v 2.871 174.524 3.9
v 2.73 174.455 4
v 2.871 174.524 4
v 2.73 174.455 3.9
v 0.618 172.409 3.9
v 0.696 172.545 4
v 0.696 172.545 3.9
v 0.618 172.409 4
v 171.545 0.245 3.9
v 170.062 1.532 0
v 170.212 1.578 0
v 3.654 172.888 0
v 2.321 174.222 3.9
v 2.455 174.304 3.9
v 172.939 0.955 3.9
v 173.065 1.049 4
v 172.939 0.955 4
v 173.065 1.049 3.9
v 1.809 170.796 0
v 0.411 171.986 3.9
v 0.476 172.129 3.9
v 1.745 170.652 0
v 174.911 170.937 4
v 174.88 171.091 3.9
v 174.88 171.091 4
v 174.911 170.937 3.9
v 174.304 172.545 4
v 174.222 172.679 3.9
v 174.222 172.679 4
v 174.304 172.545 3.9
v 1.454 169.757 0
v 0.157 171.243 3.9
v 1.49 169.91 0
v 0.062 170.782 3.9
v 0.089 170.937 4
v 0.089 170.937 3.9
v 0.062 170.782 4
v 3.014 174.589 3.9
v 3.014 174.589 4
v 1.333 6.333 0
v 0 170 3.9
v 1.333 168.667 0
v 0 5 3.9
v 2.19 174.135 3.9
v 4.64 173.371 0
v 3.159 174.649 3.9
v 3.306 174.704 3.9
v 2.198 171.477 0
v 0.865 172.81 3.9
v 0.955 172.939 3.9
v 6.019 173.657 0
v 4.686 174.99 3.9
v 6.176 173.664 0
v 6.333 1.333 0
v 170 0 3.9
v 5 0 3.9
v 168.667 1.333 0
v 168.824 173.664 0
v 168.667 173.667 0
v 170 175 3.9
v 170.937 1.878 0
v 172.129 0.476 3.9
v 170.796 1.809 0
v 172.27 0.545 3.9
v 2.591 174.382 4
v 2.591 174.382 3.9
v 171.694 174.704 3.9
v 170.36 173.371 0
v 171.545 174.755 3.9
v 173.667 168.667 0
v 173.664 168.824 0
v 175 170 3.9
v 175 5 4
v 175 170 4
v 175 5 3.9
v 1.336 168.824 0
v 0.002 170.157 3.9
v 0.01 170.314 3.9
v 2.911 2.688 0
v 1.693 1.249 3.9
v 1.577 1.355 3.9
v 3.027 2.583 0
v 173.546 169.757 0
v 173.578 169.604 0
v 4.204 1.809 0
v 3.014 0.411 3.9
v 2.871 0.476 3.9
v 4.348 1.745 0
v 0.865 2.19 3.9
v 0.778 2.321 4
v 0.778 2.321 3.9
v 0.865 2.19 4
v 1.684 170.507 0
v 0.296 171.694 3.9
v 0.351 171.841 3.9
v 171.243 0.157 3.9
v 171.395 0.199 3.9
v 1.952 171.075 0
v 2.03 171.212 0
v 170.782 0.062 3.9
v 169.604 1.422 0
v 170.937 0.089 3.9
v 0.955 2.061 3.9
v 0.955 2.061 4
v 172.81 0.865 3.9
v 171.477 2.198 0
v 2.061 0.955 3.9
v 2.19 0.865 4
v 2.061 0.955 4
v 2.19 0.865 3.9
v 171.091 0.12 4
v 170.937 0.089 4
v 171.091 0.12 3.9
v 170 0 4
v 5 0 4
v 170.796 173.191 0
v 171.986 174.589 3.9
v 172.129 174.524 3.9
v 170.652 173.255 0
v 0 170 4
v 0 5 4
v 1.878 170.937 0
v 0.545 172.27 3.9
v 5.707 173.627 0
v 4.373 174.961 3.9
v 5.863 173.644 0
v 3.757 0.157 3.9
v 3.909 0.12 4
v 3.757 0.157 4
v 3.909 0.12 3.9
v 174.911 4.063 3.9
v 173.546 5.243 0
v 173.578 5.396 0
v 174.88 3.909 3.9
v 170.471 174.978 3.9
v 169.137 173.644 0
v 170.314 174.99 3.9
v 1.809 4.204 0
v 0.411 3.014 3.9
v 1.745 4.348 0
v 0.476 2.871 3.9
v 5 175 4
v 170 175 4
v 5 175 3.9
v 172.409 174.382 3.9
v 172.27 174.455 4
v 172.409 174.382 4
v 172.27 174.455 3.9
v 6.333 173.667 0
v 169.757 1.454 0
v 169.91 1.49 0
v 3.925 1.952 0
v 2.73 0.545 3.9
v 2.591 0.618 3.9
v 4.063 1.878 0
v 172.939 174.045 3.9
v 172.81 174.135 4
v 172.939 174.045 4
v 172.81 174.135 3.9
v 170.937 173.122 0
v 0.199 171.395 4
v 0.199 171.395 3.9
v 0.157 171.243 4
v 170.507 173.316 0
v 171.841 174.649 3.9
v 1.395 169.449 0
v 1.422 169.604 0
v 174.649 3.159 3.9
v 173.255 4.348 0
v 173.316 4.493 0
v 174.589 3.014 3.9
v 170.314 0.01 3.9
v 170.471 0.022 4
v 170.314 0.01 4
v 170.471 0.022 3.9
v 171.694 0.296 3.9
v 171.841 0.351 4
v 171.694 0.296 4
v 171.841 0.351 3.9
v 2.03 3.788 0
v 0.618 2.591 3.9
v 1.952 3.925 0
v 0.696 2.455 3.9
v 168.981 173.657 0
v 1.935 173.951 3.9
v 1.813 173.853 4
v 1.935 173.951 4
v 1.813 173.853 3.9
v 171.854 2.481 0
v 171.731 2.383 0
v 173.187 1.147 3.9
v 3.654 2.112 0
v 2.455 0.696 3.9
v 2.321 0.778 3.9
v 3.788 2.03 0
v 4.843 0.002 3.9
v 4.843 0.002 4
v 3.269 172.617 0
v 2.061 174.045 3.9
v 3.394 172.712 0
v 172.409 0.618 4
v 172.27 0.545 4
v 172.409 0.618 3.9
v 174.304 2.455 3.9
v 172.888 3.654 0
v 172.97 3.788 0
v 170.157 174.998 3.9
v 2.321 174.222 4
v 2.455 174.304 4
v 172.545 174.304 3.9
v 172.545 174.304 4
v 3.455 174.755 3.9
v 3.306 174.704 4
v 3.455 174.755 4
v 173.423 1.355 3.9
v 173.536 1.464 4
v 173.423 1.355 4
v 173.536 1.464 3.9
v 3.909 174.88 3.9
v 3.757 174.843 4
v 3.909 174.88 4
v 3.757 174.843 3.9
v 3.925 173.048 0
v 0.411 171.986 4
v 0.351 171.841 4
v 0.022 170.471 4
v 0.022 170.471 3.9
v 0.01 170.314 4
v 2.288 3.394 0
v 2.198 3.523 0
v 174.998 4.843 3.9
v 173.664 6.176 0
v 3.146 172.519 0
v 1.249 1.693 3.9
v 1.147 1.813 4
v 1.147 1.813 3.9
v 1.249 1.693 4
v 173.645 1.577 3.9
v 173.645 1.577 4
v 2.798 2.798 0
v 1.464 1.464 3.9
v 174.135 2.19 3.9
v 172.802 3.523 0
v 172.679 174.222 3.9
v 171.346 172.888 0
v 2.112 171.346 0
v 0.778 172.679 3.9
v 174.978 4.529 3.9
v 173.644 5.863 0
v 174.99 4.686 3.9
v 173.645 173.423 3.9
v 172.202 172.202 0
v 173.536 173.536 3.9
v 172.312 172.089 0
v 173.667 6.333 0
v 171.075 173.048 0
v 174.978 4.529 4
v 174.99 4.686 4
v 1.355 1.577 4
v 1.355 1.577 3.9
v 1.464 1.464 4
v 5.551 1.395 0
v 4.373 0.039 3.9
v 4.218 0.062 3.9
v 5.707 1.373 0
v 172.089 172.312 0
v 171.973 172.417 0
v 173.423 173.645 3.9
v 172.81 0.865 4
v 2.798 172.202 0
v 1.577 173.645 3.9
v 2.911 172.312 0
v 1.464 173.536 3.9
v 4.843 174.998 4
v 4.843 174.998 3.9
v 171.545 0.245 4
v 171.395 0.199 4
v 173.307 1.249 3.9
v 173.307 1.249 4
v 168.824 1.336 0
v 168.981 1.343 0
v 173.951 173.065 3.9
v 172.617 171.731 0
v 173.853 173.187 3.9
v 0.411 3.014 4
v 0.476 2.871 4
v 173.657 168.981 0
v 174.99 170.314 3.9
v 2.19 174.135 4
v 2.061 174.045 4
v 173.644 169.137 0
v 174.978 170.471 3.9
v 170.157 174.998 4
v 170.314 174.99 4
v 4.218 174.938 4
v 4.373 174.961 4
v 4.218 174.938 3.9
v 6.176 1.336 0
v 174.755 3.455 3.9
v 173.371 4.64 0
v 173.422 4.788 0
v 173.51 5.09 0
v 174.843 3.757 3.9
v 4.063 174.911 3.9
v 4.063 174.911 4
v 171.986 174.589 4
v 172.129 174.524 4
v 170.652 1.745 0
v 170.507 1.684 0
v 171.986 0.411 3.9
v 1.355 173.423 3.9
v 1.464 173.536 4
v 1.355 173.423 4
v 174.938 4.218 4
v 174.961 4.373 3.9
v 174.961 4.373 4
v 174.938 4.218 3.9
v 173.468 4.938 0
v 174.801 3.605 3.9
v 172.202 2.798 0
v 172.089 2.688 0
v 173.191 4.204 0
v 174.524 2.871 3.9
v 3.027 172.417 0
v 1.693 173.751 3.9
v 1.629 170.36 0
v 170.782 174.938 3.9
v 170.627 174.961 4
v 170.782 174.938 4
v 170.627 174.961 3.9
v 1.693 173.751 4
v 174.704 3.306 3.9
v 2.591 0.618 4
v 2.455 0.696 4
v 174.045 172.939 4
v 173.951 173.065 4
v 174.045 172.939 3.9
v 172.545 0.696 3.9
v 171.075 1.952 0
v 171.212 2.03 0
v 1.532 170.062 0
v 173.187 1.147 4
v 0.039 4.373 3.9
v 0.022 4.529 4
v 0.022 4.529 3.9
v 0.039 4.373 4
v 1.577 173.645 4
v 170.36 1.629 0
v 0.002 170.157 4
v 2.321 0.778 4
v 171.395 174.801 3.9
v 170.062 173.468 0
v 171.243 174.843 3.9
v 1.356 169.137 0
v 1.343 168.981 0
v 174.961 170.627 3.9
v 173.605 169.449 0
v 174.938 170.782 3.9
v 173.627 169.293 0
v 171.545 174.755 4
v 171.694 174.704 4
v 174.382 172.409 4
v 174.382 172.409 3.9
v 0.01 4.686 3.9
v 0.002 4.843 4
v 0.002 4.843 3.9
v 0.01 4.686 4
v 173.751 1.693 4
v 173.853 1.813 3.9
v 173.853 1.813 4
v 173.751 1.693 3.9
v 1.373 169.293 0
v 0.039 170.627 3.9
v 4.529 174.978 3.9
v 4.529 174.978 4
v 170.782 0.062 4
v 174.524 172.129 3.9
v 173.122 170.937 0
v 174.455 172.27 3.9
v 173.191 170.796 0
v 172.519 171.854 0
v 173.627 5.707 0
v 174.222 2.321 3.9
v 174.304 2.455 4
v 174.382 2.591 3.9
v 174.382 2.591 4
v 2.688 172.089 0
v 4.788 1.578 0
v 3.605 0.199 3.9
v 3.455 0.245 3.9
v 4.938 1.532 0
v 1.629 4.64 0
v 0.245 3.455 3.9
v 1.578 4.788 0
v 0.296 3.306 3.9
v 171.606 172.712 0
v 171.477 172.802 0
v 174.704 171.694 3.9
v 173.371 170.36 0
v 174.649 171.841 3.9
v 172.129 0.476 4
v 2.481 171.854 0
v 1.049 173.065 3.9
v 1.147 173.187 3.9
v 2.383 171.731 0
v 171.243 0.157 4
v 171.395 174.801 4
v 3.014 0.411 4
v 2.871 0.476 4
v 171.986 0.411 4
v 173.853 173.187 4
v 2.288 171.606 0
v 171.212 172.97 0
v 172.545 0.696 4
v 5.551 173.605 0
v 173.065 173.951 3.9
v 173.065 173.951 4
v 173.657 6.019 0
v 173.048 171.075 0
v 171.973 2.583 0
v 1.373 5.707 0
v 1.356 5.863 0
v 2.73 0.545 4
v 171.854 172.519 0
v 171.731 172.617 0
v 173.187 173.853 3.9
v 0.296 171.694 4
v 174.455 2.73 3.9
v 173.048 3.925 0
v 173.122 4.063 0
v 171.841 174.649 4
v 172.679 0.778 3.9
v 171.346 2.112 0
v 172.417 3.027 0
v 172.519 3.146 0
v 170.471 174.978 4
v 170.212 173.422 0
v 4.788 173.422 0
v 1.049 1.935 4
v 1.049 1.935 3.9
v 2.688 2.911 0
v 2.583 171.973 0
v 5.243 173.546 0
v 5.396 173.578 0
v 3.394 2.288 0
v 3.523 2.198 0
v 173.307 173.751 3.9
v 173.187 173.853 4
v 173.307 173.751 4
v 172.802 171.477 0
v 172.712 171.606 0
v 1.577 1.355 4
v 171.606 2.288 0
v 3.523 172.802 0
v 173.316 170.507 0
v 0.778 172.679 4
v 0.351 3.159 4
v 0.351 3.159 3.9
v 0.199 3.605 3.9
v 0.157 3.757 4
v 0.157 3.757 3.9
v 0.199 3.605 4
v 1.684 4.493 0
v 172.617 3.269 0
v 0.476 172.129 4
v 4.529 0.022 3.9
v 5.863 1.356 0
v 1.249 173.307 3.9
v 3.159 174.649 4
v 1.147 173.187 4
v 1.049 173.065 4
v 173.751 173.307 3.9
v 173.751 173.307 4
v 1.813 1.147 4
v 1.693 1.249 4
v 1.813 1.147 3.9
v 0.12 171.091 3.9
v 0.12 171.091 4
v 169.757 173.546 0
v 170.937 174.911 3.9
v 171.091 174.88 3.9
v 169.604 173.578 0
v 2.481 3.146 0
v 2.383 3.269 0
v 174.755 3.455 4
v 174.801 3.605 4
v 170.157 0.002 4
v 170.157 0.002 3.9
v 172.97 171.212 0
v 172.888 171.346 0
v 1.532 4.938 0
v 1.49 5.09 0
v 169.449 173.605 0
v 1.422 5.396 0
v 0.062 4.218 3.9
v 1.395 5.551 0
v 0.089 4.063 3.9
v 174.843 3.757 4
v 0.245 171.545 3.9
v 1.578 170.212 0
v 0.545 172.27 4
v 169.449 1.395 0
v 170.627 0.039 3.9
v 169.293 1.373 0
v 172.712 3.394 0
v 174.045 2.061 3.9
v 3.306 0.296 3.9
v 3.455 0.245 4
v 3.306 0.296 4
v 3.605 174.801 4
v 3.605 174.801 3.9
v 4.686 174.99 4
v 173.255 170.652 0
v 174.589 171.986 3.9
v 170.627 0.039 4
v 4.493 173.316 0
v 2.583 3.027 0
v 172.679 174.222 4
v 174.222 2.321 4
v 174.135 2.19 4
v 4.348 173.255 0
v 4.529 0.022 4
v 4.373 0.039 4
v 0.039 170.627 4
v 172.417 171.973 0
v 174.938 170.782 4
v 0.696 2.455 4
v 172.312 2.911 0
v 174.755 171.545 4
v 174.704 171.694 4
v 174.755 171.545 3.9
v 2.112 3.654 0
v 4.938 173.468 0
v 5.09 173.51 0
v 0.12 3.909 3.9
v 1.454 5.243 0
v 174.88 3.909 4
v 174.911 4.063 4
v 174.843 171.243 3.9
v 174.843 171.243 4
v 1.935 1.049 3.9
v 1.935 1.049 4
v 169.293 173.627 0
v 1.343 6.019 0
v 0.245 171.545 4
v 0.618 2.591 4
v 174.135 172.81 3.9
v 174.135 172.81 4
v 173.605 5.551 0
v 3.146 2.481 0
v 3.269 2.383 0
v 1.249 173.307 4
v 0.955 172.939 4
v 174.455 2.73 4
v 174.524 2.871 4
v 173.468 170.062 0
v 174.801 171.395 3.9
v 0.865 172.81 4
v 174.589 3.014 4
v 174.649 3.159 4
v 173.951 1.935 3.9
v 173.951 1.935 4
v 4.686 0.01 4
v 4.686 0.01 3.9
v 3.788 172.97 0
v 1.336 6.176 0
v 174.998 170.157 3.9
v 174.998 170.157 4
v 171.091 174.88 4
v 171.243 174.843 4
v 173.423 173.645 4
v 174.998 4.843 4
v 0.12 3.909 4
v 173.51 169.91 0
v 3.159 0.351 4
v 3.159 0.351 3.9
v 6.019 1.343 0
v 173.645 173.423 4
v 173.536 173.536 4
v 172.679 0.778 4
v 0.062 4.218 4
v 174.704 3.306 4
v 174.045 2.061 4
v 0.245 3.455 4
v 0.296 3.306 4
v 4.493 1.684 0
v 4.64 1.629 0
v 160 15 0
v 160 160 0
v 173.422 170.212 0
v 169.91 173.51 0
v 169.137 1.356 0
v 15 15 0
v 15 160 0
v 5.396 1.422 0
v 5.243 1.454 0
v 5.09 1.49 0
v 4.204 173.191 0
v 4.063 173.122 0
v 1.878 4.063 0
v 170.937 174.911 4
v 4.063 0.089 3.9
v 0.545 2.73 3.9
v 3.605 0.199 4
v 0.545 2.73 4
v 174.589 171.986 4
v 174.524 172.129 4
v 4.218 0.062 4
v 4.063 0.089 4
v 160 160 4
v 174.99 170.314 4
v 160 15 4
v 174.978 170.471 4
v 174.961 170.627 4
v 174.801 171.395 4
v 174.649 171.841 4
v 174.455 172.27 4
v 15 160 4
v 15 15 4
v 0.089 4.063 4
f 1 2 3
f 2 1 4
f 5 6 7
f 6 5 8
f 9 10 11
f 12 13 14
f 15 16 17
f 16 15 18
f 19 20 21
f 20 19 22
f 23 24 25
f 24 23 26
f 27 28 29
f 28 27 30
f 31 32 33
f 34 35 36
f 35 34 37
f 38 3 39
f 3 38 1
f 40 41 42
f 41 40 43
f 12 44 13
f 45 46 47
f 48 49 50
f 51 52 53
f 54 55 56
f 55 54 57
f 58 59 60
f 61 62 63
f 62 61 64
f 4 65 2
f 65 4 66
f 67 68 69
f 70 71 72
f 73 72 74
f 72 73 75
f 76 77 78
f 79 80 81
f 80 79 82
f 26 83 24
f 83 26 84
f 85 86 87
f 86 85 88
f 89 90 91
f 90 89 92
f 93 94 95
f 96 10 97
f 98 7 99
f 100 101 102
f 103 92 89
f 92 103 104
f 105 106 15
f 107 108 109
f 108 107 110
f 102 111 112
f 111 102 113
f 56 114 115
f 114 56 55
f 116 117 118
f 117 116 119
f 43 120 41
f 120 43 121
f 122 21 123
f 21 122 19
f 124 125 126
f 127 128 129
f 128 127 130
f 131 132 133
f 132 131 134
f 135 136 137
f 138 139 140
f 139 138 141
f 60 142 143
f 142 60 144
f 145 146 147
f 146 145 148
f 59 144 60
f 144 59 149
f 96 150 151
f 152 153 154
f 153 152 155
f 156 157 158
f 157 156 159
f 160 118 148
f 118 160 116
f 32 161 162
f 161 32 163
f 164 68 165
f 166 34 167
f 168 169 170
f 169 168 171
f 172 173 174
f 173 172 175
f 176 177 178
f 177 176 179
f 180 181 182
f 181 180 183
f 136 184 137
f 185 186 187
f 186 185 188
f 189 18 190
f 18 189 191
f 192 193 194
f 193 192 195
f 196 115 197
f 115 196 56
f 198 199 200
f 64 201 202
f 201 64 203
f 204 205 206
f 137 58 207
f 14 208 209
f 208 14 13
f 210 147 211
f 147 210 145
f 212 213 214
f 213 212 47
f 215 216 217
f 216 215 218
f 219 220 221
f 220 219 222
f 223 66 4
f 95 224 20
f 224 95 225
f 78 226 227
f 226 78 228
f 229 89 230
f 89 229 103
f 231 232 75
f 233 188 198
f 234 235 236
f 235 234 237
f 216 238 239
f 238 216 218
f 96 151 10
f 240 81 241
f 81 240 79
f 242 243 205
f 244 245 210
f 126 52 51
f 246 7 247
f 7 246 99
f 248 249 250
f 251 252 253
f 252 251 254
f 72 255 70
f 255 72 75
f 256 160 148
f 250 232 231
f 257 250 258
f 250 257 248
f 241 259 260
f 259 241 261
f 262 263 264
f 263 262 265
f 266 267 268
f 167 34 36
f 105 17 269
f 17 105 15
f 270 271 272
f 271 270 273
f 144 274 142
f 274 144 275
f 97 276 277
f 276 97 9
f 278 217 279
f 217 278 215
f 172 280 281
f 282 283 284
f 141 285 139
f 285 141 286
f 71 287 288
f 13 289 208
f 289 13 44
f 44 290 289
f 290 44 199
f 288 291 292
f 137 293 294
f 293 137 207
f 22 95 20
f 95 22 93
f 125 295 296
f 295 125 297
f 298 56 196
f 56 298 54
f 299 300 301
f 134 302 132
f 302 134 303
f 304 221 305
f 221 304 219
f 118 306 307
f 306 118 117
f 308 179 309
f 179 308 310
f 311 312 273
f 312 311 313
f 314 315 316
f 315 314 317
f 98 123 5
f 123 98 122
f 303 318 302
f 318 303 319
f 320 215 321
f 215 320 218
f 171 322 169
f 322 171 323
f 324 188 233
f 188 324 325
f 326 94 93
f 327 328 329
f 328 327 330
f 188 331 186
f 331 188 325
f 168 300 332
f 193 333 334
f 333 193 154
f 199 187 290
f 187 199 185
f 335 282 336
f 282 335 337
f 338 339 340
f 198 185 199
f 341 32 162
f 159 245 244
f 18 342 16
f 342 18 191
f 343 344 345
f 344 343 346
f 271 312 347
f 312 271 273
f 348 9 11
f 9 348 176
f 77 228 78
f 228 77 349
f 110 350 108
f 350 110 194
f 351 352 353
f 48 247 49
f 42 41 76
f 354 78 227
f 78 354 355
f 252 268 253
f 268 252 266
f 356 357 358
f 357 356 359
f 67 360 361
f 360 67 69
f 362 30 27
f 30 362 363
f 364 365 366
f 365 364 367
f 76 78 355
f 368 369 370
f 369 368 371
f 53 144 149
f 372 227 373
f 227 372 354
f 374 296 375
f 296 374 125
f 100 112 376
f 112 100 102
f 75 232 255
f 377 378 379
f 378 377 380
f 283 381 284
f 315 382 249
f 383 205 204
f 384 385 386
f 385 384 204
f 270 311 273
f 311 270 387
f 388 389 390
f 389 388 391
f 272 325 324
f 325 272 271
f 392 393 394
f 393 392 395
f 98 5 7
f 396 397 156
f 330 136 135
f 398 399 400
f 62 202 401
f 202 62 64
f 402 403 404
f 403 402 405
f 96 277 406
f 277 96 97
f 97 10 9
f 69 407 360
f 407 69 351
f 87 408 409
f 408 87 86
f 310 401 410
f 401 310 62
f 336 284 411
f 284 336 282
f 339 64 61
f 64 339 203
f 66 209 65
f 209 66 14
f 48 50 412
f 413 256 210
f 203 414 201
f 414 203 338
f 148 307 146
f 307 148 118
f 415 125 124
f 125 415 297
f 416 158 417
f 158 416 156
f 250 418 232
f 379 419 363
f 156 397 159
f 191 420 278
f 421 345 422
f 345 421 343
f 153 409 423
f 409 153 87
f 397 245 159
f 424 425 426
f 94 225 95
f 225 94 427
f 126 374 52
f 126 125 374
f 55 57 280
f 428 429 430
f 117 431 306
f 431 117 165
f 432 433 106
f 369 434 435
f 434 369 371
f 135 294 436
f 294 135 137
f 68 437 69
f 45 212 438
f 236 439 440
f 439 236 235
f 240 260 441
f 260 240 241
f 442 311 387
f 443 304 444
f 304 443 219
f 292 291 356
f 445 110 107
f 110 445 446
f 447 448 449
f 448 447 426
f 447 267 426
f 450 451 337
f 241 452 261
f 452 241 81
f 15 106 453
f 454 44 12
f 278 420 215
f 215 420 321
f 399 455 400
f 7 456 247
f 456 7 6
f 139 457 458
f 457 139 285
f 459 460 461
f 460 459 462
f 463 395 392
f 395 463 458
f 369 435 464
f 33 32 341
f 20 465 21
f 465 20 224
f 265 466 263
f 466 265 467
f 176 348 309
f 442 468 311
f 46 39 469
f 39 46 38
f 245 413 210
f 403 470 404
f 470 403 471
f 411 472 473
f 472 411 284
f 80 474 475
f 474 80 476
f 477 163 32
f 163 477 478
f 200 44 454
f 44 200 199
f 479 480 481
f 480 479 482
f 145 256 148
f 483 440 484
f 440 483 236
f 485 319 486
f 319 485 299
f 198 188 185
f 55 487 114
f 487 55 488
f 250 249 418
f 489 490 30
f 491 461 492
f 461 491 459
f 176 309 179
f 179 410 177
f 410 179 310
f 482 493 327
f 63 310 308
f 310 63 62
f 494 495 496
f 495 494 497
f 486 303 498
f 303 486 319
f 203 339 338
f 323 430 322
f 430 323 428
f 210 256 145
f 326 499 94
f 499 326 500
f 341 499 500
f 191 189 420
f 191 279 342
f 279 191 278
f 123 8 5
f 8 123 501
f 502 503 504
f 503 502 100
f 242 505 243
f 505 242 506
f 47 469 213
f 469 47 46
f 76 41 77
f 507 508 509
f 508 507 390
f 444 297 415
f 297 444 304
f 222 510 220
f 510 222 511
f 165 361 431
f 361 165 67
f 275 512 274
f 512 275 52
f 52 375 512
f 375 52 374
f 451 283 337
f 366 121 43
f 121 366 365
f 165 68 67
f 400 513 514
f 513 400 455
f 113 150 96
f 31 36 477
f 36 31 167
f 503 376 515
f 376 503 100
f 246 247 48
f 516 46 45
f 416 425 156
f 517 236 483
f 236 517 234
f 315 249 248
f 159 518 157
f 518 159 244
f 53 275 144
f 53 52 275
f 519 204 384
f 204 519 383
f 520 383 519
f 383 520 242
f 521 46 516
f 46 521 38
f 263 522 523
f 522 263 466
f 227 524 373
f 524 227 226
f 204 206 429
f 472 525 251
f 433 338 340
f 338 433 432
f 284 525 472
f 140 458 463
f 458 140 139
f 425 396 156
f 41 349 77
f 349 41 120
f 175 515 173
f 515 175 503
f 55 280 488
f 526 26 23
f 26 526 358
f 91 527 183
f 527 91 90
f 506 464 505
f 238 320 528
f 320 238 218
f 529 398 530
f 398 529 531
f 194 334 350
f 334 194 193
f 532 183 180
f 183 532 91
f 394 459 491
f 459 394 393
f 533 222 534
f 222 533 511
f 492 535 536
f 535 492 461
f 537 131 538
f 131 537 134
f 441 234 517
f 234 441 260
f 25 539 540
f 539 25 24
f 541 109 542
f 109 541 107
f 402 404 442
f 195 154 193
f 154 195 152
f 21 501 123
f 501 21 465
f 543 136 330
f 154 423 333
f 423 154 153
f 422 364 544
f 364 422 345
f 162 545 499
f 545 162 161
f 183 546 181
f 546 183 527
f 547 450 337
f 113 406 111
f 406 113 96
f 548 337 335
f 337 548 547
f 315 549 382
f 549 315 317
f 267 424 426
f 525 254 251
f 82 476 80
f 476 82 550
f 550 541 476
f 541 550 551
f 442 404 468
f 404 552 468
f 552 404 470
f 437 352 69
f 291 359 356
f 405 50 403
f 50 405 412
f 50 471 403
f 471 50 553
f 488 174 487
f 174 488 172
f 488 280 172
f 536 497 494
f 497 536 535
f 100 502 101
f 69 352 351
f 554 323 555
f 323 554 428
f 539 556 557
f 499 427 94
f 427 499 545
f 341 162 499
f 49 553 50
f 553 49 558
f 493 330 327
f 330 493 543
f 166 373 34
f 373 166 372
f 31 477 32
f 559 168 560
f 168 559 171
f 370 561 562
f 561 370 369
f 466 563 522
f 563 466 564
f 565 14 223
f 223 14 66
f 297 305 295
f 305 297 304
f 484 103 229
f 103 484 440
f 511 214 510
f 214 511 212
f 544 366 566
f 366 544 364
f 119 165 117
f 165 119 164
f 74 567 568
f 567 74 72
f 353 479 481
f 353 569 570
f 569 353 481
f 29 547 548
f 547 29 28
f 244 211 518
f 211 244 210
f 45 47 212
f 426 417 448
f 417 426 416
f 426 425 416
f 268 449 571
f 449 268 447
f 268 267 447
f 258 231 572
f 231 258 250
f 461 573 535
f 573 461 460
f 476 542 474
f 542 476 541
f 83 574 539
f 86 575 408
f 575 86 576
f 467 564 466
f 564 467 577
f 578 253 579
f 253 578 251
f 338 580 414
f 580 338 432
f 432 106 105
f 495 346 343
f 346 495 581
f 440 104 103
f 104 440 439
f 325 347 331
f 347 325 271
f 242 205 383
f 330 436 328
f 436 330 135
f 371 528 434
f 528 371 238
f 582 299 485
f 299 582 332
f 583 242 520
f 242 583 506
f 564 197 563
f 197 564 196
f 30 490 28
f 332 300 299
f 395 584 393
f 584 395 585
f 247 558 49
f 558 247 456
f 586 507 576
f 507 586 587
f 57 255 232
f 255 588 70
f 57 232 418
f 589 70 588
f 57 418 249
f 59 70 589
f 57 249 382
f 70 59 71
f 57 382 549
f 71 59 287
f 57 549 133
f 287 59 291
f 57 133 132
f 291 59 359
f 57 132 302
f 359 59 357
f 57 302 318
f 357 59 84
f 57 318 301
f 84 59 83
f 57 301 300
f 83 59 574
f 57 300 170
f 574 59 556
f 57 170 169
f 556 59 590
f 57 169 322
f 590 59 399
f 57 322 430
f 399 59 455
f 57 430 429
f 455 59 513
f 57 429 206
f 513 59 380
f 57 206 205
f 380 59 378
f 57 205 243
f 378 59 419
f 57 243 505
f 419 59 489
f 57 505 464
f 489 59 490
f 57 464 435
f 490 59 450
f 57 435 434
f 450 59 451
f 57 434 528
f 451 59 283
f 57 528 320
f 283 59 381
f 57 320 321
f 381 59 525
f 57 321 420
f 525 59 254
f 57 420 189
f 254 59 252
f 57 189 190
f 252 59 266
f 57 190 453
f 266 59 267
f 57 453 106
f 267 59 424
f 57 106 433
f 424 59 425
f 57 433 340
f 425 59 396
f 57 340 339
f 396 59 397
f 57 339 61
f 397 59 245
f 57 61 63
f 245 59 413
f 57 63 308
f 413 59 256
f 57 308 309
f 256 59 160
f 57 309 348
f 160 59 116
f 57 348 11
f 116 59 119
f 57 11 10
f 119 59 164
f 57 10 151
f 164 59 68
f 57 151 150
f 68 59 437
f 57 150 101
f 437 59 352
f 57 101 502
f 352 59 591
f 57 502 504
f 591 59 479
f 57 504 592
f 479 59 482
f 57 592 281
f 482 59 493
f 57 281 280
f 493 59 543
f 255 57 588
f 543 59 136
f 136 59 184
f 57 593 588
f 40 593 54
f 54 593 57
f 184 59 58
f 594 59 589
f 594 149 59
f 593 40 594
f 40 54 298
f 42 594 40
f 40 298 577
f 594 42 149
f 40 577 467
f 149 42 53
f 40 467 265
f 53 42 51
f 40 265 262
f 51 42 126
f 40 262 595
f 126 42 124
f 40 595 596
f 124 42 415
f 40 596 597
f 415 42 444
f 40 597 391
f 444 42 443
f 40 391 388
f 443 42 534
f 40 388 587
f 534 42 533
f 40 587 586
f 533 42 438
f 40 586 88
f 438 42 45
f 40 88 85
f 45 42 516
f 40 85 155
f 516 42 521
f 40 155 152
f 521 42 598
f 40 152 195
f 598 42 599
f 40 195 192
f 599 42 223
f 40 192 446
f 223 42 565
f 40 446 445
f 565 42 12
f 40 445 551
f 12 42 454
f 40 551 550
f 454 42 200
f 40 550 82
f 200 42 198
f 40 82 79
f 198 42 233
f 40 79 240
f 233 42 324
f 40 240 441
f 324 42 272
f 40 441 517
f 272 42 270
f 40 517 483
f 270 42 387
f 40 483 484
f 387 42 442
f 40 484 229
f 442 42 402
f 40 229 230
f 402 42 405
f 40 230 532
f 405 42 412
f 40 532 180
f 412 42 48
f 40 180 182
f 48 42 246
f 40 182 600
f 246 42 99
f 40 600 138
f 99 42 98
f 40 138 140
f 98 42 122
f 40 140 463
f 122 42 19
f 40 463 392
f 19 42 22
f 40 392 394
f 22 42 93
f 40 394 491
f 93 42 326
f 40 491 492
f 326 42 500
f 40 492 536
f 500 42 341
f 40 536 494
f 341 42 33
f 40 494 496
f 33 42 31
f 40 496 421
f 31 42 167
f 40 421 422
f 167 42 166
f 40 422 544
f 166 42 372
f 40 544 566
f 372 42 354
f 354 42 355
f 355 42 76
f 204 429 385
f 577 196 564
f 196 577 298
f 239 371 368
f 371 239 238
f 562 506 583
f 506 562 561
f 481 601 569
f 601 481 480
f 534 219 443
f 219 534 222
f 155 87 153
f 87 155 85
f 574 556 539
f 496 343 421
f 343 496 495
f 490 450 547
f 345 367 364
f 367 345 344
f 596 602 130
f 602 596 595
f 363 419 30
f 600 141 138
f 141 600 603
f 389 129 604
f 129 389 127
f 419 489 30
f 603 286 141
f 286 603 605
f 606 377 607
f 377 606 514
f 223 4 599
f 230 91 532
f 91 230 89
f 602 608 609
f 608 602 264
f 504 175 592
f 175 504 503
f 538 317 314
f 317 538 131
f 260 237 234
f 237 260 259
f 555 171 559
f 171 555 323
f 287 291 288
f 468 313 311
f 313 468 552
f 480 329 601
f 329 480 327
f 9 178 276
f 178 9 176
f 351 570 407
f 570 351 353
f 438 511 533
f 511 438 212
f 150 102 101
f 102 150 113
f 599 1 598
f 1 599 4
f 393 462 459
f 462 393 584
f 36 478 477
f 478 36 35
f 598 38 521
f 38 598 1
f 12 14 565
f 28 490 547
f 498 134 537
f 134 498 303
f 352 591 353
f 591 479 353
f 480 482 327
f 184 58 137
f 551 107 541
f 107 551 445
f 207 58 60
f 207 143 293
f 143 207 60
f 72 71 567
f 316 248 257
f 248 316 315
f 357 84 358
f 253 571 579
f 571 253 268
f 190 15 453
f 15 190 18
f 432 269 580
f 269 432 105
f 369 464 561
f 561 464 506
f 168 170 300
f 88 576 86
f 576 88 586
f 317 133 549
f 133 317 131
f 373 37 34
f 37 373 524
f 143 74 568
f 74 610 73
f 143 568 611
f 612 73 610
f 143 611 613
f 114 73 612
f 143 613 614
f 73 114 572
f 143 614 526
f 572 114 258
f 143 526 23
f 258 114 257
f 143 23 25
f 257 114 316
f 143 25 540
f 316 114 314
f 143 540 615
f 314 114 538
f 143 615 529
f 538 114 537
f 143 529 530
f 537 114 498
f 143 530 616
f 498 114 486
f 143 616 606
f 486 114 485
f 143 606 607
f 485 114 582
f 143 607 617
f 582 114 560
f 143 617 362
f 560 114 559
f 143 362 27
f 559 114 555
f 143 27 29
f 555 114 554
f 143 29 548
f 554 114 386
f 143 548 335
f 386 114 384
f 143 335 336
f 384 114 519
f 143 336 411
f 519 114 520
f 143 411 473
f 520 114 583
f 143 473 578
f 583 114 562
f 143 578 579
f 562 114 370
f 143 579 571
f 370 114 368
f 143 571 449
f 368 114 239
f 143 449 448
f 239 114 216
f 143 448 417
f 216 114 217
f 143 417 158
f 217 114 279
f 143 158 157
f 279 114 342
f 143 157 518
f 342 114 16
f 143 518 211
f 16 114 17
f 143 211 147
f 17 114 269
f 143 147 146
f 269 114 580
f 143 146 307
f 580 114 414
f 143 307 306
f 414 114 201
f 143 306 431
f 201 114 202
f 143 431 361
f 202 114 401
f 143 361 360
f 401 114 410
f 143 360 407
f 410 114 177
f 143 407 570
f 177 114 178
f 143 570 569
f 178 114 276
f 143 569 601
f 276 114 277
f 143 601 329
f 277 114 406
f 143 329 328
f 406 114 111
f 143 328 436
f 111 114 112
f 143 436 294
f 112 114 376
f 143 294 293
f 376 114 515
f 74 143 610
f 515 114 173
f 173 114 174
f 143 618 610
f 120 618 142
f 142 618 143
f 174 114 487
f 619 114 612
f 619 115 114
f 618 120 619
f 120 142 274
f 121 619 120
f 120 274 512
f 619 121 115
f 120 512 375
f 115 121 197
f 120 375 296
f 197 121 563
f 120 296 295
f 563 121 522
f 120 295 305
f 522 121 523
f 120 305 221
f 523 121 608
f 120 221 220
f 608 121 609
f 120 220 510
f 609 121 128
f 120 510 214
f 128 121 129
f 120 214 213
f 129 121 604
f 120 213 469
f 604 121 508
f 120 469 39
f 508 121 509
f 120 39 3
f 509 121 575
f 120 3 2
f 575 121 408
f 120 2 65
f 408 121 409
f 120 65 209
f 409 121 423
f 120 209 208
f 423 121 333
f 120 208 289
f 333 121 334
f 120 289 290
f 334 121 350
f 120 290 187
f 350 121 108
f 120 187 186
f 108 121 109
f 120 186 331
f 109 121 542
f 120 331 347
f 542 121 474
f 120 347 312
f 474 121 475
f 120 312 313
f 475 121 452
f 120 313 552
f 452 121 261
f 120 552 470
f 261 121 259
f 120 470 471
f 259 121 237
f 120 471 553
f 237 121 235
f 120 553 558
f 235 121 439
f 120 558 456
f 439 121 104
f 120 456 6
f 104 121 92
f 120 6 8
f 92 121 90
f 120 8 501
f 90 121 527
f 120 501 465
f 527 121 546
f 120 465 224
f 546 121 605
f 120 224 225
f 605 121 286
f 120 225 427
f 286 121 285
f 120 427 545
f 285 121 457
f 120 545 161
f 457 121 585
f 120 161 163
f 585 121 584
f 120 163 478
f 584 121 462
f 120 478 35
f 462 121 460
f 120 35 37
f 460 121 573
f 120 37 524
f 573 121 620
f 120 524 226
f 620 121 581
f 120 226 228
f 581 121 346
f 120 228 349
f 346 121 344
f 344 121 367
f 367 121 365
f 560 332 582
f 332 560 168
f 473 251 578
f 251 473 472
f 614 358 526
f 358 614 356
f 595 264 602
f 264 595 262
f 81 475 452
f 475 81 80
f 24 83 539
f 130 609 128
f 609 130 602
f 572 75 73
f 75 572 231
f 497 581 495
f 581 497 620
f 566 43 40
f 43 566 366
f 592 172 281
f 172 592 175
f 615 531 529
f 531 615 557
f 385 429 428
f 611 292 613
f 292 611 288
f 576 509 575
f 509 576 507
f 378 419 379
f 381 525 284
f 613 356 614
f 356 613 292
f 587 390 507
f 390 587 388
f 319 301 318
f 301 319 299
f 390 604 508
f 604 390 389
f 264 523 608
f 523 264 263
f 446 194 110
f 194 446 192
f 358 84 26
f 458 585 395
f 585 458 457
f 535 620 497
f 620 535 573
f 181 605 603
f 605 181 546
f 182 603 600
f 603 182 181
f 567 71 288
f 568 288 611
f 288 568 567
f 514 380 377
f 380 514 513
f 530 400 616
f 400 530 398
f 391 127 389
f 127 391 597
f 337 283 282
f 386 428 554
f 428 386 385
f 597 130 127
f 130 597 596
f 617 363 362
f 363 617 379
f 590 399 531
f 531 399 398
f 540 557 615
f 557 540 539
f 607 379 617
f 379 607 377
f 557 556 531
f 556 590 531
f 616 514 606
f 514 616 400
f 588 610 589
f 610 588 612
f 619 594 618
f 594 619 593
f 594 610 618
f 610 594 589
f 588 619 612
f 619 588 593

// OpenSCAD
// file: ../sc.scad
// ShortCuts.scad 
// Autor: Rudolf Huttary, Berlin 2015
//
$fn = 100; 

//show_examples(); 

module show_examples()
	place_in_rect(30, 30)
	{
		Cy(h = 10); 
		CyH(h = 10); 
		CyH(h = 10, w = 30); 
		CyS(h = 10); 
		CyS(h = 10, w1 = 25, w2 = 75); 
		Cu(10); 
		Ri(h = 10); 
		RiH(h = 10); 
		RiS(h = 10, w1 = 10); 
		RiS(h = 10, w1 = 30, w2 = 300); 
		Sp(); 
		SpH(10, 30, 30); 
	}


module help()
{
echo("==============="); 
echo("help(): shows this help"); 
echo("show_examples(): shows some examples"); 
echo("place_in_rect(): places children objects in grid"); 
echo("Transformations:"); 
echo(" transform :  T(x=0, y=0, z=0), Tx(x=0) , Ty(y=0), Tz(z=0)"); 
echo(" rotate :  R(x=0, y=0, z=0), Rx(x=0) , Ry(y=0), Rz(z=0)"); 
echo(" scale :  S(x=1, y=1, z=1), Sx(x=1) , Sy(y=1), Sz(z=1)"); 
echo("Logical"); 
echo(" difference :  D()"); 
echo(" union :  U()"); 
echo(" intersection : *missing*"); 
echo("Primitives"); 
echo(" circle :  Ci(r=10)"); 
echo(" circle_half :  CiH(r=10, w=0)")
echo(" circle_segment :  CiS(r=10, w1=0, w2=90)")
echo(" square :  Sq(x=10, y=0, center=true))"); 
echo(" cylinder :  Cy(r=10, h=1, center=true)"); 
echo(" cylinder_half :  CyH(r=10, w=0)")
echo(" cylinder_segment: CyS(r=10, h=1, w1=0, w2=90,center=true)"); 
echo(" cylinder_segment: Pie(r=10, h=1, w1=0, w2=90,center=true)"); 
echo(" cube :  Cu(x=10, y=0, z=10, center=true)"); 
echo(" ring :  Ri(R=10, r=5, h=1, center=true)"); 
echo(" ring_half :  RiH(R=10, r=5, h=1, w=0 center=true)"); 
echo(" ring_segment :  RiS(R=10, r=5, h=1, w1=0, w2=90, center=true)"); 
echo(" sphere:  Sp(r=10))"); 
echo(" sphere_half:  SpH(r=10, w1 = 0, w2 = 0))"); 
echo("==============="); 
}

// Euclidean Transformations
module T(x=0, y=0, z=0){translate([x, y, z])children(); }
module Tx(x) { translate([x, 0, 0])children(); }
module Ty(y) { translate([0, y, 0])children(); }
module Tz(z) { translate([0, 0, z])children(); }

module R(x=0, y=0, z=0){rotate([x, y, z]) children();}
module Rx(x=90){rotate([x, 0, 0]) children();}
module Ry(y=90){rotate([0, y, 0]) children();}
module Rz(z=90){rotate([0, 0, z]) children();}

module M(x=0, y=0, z=0){mirror([x, y, z]) children();}
module Mx(x=1){mirror([x, 0, 0]) children();}
module My(y=1){mirror([0, y, 0]) children();}
module Mz(z=1){mirror([0, 0, z]) children();}

module S(x=1, y=1, z=1){scale([x, y, z]) children();}
module Sx(x=1){scale([x, 1, 1]) children();}
module Sy(y=1){scale([1, y, 1]) children();}
module Sz(z=1){scale([1, 1, z]) children();}

module D() difference(){children(0); children([1:$children-1]);}
module U() children([0:$children-1]);
// module I() intersection()children([0:$children-1]); // does not work for some reason


// primitives - 2D

module Sq(x =10, y = 0, center = false)
{
   if(y==0)
		square([x, x], center = center); 
	else
		square([x, y], center = center); 
}
module Ci(r = 10)
{
	circle(r = r); 
}

// derived primitives - 2d
module CiH(r = 10, w = 0)
  circle_half(r, w); 

module CiS(r = 10, w1 = 0, w2 = 90)
  circle_segment(r, w1, w2); 


// primitives - 3d
module Cy(r = 10, h = 1, center = false)
{
	cylinder(r = r, h = h, center = center); 
}
module Cu(x = 10, y = 0, z = 10, center = false)
{
  if (y==0)
	cube([x, x, x], center = center); 
  else
	cube([x, y, z], center = center); 
}

// derived primitives - 3d
module CyH(r = 10, h = 1, w = 0, center = false)
  cylinder_half(r, h, w, center); 

module CyS(r = 10, h = 1, w1 = 0, w2 = 90, center = false)
  cylinder_segment(r, h, w1, w2, center); 

module Ri(R = 10, r = 5, h = 1, center = false)
  ring(R, r, h, center); 

module RiS(R = 10, r = 5, h = 1, w1 = 0, w2 = 90, center = false)
   ring_segment(R, r, h, w1, w2, center); 

module RiH(r1 = 10, r2, h = 1, w = 0, center = false)
   ring_half(r1, r2, h, w, center); 
module Pie(r = 10, h = 1, w1 = 0, w2 = 90, center = false)
  cylinder_segment(r, h, w1, w2, center);  
module Sp(r = 10)
  sphere(r); 
module SpH(r = 10, w1 = 0, w2 = 0)
  sphere_half(r, w1, w2); 
module SpS(r = 10, w1 = 0, w2 = 90, w3 = 90)
  sphere_segment(r, w1, w2); 




// clear text definitions
module circle_half(r = 10, w = 0)
{
	difference()
	{
		circle(r); 
     rotate([0, 0, w-90])
     translate([0, -r])
		square([r, 2*r], center = false); 
	}
}

module circle_segment(r = 10, w1 = 0, w2 = 90)
{
  W2 = (w1>w2)?w2+360:w2; 
  if (W2-w1 < 180)
    intersection()
		{
       circle_half(r, w1); 
       circle_half(r, W2-180); 
 		}
	else
    union()
		{
       circle_half(r, w1); 
       circle_half(r, W2-180); 
 		}
}

module cylinder_half(r = 10, h = 1, w = 0, center = true)
{
  linear_extrude(height = h, center = center)
  circle_half(r, w); 
} 

module cylinder_segment(r = 10, h = 1, w1 = 0, w2 = 90, center = true)
{
  linear_extrude(height = h, center = center)
  circle_segment(r, w1, w2); 
} 

module ring(R = 10, r = 5, h = 1, center = true)
{
	difference()
	{
	cylinder(r = R, h = h, center = center); 
   translate([0, 0, -2*h])
	cylinder(r = r, h = 4*h, center = false); 
	}
}

module ring_half(R = 10, r = 5, h = 1, w = 0, center = true)
{
	difference()
	{
		ring(R, r, h, center); 
     rotate([0, 0, w])
     translate([0, -R/2, 0])
		cube([2*R, R, 3*h], center = true); 
	}
}

module ring_segment(R = 10, r = 5, h = 1, w1 = 0, w2 = 90, center = true)
{
  W2 = (w1>w2)?w2+360:w2; 
  if (W2-w1 < 180)
    intersection()
		{
       ring_half(R, r, h, w1, center); 
       ring_half(R, r, h, W2-180, center); 
 		}
	else
    union()
		{
       ring_half(R, r, h, w1, center); 
       ring_half(R, r, h, W2-180, center); 
 		}
}


module sphere_half(r = 10, w1 = 0, w2 = 0)
{  
	difference()
	{
   	sphere(r); 
      rotate([-w1, -w2, 0])
     	translate([0, 0, r])
		cube([2*r, 2*r, r], center = true); 
	}

}


// additional code
module place_in_rect(dx =20, dy=20)
{
  cols = ceil(sqrt($children)); 
  rows = floor(sqrt($children)); 
  for(i = [0:$children-1])
	{ 
	  T(dx*(-cols/2+(i%cols)+.5), dy*(rows/2-floor(i/cols)-.5))
		 children(i); 
	}
}
// main file
use <../lib.scad>
$fn=200;

s=175;
h=4;
r=5;
d=h/3;

t=15;




difference(){
    union(){

        hull(){            
            translate([d,d,0])
            rcube(s-2*d,s-2*d,.1,r);
            
            translate([0,0,h-.1])
            rcube(s,s,.1,r);            
        }
    }

    translate([t,t,-.1])
    cube([s-t*2, s-t*2, h+1]);
}
